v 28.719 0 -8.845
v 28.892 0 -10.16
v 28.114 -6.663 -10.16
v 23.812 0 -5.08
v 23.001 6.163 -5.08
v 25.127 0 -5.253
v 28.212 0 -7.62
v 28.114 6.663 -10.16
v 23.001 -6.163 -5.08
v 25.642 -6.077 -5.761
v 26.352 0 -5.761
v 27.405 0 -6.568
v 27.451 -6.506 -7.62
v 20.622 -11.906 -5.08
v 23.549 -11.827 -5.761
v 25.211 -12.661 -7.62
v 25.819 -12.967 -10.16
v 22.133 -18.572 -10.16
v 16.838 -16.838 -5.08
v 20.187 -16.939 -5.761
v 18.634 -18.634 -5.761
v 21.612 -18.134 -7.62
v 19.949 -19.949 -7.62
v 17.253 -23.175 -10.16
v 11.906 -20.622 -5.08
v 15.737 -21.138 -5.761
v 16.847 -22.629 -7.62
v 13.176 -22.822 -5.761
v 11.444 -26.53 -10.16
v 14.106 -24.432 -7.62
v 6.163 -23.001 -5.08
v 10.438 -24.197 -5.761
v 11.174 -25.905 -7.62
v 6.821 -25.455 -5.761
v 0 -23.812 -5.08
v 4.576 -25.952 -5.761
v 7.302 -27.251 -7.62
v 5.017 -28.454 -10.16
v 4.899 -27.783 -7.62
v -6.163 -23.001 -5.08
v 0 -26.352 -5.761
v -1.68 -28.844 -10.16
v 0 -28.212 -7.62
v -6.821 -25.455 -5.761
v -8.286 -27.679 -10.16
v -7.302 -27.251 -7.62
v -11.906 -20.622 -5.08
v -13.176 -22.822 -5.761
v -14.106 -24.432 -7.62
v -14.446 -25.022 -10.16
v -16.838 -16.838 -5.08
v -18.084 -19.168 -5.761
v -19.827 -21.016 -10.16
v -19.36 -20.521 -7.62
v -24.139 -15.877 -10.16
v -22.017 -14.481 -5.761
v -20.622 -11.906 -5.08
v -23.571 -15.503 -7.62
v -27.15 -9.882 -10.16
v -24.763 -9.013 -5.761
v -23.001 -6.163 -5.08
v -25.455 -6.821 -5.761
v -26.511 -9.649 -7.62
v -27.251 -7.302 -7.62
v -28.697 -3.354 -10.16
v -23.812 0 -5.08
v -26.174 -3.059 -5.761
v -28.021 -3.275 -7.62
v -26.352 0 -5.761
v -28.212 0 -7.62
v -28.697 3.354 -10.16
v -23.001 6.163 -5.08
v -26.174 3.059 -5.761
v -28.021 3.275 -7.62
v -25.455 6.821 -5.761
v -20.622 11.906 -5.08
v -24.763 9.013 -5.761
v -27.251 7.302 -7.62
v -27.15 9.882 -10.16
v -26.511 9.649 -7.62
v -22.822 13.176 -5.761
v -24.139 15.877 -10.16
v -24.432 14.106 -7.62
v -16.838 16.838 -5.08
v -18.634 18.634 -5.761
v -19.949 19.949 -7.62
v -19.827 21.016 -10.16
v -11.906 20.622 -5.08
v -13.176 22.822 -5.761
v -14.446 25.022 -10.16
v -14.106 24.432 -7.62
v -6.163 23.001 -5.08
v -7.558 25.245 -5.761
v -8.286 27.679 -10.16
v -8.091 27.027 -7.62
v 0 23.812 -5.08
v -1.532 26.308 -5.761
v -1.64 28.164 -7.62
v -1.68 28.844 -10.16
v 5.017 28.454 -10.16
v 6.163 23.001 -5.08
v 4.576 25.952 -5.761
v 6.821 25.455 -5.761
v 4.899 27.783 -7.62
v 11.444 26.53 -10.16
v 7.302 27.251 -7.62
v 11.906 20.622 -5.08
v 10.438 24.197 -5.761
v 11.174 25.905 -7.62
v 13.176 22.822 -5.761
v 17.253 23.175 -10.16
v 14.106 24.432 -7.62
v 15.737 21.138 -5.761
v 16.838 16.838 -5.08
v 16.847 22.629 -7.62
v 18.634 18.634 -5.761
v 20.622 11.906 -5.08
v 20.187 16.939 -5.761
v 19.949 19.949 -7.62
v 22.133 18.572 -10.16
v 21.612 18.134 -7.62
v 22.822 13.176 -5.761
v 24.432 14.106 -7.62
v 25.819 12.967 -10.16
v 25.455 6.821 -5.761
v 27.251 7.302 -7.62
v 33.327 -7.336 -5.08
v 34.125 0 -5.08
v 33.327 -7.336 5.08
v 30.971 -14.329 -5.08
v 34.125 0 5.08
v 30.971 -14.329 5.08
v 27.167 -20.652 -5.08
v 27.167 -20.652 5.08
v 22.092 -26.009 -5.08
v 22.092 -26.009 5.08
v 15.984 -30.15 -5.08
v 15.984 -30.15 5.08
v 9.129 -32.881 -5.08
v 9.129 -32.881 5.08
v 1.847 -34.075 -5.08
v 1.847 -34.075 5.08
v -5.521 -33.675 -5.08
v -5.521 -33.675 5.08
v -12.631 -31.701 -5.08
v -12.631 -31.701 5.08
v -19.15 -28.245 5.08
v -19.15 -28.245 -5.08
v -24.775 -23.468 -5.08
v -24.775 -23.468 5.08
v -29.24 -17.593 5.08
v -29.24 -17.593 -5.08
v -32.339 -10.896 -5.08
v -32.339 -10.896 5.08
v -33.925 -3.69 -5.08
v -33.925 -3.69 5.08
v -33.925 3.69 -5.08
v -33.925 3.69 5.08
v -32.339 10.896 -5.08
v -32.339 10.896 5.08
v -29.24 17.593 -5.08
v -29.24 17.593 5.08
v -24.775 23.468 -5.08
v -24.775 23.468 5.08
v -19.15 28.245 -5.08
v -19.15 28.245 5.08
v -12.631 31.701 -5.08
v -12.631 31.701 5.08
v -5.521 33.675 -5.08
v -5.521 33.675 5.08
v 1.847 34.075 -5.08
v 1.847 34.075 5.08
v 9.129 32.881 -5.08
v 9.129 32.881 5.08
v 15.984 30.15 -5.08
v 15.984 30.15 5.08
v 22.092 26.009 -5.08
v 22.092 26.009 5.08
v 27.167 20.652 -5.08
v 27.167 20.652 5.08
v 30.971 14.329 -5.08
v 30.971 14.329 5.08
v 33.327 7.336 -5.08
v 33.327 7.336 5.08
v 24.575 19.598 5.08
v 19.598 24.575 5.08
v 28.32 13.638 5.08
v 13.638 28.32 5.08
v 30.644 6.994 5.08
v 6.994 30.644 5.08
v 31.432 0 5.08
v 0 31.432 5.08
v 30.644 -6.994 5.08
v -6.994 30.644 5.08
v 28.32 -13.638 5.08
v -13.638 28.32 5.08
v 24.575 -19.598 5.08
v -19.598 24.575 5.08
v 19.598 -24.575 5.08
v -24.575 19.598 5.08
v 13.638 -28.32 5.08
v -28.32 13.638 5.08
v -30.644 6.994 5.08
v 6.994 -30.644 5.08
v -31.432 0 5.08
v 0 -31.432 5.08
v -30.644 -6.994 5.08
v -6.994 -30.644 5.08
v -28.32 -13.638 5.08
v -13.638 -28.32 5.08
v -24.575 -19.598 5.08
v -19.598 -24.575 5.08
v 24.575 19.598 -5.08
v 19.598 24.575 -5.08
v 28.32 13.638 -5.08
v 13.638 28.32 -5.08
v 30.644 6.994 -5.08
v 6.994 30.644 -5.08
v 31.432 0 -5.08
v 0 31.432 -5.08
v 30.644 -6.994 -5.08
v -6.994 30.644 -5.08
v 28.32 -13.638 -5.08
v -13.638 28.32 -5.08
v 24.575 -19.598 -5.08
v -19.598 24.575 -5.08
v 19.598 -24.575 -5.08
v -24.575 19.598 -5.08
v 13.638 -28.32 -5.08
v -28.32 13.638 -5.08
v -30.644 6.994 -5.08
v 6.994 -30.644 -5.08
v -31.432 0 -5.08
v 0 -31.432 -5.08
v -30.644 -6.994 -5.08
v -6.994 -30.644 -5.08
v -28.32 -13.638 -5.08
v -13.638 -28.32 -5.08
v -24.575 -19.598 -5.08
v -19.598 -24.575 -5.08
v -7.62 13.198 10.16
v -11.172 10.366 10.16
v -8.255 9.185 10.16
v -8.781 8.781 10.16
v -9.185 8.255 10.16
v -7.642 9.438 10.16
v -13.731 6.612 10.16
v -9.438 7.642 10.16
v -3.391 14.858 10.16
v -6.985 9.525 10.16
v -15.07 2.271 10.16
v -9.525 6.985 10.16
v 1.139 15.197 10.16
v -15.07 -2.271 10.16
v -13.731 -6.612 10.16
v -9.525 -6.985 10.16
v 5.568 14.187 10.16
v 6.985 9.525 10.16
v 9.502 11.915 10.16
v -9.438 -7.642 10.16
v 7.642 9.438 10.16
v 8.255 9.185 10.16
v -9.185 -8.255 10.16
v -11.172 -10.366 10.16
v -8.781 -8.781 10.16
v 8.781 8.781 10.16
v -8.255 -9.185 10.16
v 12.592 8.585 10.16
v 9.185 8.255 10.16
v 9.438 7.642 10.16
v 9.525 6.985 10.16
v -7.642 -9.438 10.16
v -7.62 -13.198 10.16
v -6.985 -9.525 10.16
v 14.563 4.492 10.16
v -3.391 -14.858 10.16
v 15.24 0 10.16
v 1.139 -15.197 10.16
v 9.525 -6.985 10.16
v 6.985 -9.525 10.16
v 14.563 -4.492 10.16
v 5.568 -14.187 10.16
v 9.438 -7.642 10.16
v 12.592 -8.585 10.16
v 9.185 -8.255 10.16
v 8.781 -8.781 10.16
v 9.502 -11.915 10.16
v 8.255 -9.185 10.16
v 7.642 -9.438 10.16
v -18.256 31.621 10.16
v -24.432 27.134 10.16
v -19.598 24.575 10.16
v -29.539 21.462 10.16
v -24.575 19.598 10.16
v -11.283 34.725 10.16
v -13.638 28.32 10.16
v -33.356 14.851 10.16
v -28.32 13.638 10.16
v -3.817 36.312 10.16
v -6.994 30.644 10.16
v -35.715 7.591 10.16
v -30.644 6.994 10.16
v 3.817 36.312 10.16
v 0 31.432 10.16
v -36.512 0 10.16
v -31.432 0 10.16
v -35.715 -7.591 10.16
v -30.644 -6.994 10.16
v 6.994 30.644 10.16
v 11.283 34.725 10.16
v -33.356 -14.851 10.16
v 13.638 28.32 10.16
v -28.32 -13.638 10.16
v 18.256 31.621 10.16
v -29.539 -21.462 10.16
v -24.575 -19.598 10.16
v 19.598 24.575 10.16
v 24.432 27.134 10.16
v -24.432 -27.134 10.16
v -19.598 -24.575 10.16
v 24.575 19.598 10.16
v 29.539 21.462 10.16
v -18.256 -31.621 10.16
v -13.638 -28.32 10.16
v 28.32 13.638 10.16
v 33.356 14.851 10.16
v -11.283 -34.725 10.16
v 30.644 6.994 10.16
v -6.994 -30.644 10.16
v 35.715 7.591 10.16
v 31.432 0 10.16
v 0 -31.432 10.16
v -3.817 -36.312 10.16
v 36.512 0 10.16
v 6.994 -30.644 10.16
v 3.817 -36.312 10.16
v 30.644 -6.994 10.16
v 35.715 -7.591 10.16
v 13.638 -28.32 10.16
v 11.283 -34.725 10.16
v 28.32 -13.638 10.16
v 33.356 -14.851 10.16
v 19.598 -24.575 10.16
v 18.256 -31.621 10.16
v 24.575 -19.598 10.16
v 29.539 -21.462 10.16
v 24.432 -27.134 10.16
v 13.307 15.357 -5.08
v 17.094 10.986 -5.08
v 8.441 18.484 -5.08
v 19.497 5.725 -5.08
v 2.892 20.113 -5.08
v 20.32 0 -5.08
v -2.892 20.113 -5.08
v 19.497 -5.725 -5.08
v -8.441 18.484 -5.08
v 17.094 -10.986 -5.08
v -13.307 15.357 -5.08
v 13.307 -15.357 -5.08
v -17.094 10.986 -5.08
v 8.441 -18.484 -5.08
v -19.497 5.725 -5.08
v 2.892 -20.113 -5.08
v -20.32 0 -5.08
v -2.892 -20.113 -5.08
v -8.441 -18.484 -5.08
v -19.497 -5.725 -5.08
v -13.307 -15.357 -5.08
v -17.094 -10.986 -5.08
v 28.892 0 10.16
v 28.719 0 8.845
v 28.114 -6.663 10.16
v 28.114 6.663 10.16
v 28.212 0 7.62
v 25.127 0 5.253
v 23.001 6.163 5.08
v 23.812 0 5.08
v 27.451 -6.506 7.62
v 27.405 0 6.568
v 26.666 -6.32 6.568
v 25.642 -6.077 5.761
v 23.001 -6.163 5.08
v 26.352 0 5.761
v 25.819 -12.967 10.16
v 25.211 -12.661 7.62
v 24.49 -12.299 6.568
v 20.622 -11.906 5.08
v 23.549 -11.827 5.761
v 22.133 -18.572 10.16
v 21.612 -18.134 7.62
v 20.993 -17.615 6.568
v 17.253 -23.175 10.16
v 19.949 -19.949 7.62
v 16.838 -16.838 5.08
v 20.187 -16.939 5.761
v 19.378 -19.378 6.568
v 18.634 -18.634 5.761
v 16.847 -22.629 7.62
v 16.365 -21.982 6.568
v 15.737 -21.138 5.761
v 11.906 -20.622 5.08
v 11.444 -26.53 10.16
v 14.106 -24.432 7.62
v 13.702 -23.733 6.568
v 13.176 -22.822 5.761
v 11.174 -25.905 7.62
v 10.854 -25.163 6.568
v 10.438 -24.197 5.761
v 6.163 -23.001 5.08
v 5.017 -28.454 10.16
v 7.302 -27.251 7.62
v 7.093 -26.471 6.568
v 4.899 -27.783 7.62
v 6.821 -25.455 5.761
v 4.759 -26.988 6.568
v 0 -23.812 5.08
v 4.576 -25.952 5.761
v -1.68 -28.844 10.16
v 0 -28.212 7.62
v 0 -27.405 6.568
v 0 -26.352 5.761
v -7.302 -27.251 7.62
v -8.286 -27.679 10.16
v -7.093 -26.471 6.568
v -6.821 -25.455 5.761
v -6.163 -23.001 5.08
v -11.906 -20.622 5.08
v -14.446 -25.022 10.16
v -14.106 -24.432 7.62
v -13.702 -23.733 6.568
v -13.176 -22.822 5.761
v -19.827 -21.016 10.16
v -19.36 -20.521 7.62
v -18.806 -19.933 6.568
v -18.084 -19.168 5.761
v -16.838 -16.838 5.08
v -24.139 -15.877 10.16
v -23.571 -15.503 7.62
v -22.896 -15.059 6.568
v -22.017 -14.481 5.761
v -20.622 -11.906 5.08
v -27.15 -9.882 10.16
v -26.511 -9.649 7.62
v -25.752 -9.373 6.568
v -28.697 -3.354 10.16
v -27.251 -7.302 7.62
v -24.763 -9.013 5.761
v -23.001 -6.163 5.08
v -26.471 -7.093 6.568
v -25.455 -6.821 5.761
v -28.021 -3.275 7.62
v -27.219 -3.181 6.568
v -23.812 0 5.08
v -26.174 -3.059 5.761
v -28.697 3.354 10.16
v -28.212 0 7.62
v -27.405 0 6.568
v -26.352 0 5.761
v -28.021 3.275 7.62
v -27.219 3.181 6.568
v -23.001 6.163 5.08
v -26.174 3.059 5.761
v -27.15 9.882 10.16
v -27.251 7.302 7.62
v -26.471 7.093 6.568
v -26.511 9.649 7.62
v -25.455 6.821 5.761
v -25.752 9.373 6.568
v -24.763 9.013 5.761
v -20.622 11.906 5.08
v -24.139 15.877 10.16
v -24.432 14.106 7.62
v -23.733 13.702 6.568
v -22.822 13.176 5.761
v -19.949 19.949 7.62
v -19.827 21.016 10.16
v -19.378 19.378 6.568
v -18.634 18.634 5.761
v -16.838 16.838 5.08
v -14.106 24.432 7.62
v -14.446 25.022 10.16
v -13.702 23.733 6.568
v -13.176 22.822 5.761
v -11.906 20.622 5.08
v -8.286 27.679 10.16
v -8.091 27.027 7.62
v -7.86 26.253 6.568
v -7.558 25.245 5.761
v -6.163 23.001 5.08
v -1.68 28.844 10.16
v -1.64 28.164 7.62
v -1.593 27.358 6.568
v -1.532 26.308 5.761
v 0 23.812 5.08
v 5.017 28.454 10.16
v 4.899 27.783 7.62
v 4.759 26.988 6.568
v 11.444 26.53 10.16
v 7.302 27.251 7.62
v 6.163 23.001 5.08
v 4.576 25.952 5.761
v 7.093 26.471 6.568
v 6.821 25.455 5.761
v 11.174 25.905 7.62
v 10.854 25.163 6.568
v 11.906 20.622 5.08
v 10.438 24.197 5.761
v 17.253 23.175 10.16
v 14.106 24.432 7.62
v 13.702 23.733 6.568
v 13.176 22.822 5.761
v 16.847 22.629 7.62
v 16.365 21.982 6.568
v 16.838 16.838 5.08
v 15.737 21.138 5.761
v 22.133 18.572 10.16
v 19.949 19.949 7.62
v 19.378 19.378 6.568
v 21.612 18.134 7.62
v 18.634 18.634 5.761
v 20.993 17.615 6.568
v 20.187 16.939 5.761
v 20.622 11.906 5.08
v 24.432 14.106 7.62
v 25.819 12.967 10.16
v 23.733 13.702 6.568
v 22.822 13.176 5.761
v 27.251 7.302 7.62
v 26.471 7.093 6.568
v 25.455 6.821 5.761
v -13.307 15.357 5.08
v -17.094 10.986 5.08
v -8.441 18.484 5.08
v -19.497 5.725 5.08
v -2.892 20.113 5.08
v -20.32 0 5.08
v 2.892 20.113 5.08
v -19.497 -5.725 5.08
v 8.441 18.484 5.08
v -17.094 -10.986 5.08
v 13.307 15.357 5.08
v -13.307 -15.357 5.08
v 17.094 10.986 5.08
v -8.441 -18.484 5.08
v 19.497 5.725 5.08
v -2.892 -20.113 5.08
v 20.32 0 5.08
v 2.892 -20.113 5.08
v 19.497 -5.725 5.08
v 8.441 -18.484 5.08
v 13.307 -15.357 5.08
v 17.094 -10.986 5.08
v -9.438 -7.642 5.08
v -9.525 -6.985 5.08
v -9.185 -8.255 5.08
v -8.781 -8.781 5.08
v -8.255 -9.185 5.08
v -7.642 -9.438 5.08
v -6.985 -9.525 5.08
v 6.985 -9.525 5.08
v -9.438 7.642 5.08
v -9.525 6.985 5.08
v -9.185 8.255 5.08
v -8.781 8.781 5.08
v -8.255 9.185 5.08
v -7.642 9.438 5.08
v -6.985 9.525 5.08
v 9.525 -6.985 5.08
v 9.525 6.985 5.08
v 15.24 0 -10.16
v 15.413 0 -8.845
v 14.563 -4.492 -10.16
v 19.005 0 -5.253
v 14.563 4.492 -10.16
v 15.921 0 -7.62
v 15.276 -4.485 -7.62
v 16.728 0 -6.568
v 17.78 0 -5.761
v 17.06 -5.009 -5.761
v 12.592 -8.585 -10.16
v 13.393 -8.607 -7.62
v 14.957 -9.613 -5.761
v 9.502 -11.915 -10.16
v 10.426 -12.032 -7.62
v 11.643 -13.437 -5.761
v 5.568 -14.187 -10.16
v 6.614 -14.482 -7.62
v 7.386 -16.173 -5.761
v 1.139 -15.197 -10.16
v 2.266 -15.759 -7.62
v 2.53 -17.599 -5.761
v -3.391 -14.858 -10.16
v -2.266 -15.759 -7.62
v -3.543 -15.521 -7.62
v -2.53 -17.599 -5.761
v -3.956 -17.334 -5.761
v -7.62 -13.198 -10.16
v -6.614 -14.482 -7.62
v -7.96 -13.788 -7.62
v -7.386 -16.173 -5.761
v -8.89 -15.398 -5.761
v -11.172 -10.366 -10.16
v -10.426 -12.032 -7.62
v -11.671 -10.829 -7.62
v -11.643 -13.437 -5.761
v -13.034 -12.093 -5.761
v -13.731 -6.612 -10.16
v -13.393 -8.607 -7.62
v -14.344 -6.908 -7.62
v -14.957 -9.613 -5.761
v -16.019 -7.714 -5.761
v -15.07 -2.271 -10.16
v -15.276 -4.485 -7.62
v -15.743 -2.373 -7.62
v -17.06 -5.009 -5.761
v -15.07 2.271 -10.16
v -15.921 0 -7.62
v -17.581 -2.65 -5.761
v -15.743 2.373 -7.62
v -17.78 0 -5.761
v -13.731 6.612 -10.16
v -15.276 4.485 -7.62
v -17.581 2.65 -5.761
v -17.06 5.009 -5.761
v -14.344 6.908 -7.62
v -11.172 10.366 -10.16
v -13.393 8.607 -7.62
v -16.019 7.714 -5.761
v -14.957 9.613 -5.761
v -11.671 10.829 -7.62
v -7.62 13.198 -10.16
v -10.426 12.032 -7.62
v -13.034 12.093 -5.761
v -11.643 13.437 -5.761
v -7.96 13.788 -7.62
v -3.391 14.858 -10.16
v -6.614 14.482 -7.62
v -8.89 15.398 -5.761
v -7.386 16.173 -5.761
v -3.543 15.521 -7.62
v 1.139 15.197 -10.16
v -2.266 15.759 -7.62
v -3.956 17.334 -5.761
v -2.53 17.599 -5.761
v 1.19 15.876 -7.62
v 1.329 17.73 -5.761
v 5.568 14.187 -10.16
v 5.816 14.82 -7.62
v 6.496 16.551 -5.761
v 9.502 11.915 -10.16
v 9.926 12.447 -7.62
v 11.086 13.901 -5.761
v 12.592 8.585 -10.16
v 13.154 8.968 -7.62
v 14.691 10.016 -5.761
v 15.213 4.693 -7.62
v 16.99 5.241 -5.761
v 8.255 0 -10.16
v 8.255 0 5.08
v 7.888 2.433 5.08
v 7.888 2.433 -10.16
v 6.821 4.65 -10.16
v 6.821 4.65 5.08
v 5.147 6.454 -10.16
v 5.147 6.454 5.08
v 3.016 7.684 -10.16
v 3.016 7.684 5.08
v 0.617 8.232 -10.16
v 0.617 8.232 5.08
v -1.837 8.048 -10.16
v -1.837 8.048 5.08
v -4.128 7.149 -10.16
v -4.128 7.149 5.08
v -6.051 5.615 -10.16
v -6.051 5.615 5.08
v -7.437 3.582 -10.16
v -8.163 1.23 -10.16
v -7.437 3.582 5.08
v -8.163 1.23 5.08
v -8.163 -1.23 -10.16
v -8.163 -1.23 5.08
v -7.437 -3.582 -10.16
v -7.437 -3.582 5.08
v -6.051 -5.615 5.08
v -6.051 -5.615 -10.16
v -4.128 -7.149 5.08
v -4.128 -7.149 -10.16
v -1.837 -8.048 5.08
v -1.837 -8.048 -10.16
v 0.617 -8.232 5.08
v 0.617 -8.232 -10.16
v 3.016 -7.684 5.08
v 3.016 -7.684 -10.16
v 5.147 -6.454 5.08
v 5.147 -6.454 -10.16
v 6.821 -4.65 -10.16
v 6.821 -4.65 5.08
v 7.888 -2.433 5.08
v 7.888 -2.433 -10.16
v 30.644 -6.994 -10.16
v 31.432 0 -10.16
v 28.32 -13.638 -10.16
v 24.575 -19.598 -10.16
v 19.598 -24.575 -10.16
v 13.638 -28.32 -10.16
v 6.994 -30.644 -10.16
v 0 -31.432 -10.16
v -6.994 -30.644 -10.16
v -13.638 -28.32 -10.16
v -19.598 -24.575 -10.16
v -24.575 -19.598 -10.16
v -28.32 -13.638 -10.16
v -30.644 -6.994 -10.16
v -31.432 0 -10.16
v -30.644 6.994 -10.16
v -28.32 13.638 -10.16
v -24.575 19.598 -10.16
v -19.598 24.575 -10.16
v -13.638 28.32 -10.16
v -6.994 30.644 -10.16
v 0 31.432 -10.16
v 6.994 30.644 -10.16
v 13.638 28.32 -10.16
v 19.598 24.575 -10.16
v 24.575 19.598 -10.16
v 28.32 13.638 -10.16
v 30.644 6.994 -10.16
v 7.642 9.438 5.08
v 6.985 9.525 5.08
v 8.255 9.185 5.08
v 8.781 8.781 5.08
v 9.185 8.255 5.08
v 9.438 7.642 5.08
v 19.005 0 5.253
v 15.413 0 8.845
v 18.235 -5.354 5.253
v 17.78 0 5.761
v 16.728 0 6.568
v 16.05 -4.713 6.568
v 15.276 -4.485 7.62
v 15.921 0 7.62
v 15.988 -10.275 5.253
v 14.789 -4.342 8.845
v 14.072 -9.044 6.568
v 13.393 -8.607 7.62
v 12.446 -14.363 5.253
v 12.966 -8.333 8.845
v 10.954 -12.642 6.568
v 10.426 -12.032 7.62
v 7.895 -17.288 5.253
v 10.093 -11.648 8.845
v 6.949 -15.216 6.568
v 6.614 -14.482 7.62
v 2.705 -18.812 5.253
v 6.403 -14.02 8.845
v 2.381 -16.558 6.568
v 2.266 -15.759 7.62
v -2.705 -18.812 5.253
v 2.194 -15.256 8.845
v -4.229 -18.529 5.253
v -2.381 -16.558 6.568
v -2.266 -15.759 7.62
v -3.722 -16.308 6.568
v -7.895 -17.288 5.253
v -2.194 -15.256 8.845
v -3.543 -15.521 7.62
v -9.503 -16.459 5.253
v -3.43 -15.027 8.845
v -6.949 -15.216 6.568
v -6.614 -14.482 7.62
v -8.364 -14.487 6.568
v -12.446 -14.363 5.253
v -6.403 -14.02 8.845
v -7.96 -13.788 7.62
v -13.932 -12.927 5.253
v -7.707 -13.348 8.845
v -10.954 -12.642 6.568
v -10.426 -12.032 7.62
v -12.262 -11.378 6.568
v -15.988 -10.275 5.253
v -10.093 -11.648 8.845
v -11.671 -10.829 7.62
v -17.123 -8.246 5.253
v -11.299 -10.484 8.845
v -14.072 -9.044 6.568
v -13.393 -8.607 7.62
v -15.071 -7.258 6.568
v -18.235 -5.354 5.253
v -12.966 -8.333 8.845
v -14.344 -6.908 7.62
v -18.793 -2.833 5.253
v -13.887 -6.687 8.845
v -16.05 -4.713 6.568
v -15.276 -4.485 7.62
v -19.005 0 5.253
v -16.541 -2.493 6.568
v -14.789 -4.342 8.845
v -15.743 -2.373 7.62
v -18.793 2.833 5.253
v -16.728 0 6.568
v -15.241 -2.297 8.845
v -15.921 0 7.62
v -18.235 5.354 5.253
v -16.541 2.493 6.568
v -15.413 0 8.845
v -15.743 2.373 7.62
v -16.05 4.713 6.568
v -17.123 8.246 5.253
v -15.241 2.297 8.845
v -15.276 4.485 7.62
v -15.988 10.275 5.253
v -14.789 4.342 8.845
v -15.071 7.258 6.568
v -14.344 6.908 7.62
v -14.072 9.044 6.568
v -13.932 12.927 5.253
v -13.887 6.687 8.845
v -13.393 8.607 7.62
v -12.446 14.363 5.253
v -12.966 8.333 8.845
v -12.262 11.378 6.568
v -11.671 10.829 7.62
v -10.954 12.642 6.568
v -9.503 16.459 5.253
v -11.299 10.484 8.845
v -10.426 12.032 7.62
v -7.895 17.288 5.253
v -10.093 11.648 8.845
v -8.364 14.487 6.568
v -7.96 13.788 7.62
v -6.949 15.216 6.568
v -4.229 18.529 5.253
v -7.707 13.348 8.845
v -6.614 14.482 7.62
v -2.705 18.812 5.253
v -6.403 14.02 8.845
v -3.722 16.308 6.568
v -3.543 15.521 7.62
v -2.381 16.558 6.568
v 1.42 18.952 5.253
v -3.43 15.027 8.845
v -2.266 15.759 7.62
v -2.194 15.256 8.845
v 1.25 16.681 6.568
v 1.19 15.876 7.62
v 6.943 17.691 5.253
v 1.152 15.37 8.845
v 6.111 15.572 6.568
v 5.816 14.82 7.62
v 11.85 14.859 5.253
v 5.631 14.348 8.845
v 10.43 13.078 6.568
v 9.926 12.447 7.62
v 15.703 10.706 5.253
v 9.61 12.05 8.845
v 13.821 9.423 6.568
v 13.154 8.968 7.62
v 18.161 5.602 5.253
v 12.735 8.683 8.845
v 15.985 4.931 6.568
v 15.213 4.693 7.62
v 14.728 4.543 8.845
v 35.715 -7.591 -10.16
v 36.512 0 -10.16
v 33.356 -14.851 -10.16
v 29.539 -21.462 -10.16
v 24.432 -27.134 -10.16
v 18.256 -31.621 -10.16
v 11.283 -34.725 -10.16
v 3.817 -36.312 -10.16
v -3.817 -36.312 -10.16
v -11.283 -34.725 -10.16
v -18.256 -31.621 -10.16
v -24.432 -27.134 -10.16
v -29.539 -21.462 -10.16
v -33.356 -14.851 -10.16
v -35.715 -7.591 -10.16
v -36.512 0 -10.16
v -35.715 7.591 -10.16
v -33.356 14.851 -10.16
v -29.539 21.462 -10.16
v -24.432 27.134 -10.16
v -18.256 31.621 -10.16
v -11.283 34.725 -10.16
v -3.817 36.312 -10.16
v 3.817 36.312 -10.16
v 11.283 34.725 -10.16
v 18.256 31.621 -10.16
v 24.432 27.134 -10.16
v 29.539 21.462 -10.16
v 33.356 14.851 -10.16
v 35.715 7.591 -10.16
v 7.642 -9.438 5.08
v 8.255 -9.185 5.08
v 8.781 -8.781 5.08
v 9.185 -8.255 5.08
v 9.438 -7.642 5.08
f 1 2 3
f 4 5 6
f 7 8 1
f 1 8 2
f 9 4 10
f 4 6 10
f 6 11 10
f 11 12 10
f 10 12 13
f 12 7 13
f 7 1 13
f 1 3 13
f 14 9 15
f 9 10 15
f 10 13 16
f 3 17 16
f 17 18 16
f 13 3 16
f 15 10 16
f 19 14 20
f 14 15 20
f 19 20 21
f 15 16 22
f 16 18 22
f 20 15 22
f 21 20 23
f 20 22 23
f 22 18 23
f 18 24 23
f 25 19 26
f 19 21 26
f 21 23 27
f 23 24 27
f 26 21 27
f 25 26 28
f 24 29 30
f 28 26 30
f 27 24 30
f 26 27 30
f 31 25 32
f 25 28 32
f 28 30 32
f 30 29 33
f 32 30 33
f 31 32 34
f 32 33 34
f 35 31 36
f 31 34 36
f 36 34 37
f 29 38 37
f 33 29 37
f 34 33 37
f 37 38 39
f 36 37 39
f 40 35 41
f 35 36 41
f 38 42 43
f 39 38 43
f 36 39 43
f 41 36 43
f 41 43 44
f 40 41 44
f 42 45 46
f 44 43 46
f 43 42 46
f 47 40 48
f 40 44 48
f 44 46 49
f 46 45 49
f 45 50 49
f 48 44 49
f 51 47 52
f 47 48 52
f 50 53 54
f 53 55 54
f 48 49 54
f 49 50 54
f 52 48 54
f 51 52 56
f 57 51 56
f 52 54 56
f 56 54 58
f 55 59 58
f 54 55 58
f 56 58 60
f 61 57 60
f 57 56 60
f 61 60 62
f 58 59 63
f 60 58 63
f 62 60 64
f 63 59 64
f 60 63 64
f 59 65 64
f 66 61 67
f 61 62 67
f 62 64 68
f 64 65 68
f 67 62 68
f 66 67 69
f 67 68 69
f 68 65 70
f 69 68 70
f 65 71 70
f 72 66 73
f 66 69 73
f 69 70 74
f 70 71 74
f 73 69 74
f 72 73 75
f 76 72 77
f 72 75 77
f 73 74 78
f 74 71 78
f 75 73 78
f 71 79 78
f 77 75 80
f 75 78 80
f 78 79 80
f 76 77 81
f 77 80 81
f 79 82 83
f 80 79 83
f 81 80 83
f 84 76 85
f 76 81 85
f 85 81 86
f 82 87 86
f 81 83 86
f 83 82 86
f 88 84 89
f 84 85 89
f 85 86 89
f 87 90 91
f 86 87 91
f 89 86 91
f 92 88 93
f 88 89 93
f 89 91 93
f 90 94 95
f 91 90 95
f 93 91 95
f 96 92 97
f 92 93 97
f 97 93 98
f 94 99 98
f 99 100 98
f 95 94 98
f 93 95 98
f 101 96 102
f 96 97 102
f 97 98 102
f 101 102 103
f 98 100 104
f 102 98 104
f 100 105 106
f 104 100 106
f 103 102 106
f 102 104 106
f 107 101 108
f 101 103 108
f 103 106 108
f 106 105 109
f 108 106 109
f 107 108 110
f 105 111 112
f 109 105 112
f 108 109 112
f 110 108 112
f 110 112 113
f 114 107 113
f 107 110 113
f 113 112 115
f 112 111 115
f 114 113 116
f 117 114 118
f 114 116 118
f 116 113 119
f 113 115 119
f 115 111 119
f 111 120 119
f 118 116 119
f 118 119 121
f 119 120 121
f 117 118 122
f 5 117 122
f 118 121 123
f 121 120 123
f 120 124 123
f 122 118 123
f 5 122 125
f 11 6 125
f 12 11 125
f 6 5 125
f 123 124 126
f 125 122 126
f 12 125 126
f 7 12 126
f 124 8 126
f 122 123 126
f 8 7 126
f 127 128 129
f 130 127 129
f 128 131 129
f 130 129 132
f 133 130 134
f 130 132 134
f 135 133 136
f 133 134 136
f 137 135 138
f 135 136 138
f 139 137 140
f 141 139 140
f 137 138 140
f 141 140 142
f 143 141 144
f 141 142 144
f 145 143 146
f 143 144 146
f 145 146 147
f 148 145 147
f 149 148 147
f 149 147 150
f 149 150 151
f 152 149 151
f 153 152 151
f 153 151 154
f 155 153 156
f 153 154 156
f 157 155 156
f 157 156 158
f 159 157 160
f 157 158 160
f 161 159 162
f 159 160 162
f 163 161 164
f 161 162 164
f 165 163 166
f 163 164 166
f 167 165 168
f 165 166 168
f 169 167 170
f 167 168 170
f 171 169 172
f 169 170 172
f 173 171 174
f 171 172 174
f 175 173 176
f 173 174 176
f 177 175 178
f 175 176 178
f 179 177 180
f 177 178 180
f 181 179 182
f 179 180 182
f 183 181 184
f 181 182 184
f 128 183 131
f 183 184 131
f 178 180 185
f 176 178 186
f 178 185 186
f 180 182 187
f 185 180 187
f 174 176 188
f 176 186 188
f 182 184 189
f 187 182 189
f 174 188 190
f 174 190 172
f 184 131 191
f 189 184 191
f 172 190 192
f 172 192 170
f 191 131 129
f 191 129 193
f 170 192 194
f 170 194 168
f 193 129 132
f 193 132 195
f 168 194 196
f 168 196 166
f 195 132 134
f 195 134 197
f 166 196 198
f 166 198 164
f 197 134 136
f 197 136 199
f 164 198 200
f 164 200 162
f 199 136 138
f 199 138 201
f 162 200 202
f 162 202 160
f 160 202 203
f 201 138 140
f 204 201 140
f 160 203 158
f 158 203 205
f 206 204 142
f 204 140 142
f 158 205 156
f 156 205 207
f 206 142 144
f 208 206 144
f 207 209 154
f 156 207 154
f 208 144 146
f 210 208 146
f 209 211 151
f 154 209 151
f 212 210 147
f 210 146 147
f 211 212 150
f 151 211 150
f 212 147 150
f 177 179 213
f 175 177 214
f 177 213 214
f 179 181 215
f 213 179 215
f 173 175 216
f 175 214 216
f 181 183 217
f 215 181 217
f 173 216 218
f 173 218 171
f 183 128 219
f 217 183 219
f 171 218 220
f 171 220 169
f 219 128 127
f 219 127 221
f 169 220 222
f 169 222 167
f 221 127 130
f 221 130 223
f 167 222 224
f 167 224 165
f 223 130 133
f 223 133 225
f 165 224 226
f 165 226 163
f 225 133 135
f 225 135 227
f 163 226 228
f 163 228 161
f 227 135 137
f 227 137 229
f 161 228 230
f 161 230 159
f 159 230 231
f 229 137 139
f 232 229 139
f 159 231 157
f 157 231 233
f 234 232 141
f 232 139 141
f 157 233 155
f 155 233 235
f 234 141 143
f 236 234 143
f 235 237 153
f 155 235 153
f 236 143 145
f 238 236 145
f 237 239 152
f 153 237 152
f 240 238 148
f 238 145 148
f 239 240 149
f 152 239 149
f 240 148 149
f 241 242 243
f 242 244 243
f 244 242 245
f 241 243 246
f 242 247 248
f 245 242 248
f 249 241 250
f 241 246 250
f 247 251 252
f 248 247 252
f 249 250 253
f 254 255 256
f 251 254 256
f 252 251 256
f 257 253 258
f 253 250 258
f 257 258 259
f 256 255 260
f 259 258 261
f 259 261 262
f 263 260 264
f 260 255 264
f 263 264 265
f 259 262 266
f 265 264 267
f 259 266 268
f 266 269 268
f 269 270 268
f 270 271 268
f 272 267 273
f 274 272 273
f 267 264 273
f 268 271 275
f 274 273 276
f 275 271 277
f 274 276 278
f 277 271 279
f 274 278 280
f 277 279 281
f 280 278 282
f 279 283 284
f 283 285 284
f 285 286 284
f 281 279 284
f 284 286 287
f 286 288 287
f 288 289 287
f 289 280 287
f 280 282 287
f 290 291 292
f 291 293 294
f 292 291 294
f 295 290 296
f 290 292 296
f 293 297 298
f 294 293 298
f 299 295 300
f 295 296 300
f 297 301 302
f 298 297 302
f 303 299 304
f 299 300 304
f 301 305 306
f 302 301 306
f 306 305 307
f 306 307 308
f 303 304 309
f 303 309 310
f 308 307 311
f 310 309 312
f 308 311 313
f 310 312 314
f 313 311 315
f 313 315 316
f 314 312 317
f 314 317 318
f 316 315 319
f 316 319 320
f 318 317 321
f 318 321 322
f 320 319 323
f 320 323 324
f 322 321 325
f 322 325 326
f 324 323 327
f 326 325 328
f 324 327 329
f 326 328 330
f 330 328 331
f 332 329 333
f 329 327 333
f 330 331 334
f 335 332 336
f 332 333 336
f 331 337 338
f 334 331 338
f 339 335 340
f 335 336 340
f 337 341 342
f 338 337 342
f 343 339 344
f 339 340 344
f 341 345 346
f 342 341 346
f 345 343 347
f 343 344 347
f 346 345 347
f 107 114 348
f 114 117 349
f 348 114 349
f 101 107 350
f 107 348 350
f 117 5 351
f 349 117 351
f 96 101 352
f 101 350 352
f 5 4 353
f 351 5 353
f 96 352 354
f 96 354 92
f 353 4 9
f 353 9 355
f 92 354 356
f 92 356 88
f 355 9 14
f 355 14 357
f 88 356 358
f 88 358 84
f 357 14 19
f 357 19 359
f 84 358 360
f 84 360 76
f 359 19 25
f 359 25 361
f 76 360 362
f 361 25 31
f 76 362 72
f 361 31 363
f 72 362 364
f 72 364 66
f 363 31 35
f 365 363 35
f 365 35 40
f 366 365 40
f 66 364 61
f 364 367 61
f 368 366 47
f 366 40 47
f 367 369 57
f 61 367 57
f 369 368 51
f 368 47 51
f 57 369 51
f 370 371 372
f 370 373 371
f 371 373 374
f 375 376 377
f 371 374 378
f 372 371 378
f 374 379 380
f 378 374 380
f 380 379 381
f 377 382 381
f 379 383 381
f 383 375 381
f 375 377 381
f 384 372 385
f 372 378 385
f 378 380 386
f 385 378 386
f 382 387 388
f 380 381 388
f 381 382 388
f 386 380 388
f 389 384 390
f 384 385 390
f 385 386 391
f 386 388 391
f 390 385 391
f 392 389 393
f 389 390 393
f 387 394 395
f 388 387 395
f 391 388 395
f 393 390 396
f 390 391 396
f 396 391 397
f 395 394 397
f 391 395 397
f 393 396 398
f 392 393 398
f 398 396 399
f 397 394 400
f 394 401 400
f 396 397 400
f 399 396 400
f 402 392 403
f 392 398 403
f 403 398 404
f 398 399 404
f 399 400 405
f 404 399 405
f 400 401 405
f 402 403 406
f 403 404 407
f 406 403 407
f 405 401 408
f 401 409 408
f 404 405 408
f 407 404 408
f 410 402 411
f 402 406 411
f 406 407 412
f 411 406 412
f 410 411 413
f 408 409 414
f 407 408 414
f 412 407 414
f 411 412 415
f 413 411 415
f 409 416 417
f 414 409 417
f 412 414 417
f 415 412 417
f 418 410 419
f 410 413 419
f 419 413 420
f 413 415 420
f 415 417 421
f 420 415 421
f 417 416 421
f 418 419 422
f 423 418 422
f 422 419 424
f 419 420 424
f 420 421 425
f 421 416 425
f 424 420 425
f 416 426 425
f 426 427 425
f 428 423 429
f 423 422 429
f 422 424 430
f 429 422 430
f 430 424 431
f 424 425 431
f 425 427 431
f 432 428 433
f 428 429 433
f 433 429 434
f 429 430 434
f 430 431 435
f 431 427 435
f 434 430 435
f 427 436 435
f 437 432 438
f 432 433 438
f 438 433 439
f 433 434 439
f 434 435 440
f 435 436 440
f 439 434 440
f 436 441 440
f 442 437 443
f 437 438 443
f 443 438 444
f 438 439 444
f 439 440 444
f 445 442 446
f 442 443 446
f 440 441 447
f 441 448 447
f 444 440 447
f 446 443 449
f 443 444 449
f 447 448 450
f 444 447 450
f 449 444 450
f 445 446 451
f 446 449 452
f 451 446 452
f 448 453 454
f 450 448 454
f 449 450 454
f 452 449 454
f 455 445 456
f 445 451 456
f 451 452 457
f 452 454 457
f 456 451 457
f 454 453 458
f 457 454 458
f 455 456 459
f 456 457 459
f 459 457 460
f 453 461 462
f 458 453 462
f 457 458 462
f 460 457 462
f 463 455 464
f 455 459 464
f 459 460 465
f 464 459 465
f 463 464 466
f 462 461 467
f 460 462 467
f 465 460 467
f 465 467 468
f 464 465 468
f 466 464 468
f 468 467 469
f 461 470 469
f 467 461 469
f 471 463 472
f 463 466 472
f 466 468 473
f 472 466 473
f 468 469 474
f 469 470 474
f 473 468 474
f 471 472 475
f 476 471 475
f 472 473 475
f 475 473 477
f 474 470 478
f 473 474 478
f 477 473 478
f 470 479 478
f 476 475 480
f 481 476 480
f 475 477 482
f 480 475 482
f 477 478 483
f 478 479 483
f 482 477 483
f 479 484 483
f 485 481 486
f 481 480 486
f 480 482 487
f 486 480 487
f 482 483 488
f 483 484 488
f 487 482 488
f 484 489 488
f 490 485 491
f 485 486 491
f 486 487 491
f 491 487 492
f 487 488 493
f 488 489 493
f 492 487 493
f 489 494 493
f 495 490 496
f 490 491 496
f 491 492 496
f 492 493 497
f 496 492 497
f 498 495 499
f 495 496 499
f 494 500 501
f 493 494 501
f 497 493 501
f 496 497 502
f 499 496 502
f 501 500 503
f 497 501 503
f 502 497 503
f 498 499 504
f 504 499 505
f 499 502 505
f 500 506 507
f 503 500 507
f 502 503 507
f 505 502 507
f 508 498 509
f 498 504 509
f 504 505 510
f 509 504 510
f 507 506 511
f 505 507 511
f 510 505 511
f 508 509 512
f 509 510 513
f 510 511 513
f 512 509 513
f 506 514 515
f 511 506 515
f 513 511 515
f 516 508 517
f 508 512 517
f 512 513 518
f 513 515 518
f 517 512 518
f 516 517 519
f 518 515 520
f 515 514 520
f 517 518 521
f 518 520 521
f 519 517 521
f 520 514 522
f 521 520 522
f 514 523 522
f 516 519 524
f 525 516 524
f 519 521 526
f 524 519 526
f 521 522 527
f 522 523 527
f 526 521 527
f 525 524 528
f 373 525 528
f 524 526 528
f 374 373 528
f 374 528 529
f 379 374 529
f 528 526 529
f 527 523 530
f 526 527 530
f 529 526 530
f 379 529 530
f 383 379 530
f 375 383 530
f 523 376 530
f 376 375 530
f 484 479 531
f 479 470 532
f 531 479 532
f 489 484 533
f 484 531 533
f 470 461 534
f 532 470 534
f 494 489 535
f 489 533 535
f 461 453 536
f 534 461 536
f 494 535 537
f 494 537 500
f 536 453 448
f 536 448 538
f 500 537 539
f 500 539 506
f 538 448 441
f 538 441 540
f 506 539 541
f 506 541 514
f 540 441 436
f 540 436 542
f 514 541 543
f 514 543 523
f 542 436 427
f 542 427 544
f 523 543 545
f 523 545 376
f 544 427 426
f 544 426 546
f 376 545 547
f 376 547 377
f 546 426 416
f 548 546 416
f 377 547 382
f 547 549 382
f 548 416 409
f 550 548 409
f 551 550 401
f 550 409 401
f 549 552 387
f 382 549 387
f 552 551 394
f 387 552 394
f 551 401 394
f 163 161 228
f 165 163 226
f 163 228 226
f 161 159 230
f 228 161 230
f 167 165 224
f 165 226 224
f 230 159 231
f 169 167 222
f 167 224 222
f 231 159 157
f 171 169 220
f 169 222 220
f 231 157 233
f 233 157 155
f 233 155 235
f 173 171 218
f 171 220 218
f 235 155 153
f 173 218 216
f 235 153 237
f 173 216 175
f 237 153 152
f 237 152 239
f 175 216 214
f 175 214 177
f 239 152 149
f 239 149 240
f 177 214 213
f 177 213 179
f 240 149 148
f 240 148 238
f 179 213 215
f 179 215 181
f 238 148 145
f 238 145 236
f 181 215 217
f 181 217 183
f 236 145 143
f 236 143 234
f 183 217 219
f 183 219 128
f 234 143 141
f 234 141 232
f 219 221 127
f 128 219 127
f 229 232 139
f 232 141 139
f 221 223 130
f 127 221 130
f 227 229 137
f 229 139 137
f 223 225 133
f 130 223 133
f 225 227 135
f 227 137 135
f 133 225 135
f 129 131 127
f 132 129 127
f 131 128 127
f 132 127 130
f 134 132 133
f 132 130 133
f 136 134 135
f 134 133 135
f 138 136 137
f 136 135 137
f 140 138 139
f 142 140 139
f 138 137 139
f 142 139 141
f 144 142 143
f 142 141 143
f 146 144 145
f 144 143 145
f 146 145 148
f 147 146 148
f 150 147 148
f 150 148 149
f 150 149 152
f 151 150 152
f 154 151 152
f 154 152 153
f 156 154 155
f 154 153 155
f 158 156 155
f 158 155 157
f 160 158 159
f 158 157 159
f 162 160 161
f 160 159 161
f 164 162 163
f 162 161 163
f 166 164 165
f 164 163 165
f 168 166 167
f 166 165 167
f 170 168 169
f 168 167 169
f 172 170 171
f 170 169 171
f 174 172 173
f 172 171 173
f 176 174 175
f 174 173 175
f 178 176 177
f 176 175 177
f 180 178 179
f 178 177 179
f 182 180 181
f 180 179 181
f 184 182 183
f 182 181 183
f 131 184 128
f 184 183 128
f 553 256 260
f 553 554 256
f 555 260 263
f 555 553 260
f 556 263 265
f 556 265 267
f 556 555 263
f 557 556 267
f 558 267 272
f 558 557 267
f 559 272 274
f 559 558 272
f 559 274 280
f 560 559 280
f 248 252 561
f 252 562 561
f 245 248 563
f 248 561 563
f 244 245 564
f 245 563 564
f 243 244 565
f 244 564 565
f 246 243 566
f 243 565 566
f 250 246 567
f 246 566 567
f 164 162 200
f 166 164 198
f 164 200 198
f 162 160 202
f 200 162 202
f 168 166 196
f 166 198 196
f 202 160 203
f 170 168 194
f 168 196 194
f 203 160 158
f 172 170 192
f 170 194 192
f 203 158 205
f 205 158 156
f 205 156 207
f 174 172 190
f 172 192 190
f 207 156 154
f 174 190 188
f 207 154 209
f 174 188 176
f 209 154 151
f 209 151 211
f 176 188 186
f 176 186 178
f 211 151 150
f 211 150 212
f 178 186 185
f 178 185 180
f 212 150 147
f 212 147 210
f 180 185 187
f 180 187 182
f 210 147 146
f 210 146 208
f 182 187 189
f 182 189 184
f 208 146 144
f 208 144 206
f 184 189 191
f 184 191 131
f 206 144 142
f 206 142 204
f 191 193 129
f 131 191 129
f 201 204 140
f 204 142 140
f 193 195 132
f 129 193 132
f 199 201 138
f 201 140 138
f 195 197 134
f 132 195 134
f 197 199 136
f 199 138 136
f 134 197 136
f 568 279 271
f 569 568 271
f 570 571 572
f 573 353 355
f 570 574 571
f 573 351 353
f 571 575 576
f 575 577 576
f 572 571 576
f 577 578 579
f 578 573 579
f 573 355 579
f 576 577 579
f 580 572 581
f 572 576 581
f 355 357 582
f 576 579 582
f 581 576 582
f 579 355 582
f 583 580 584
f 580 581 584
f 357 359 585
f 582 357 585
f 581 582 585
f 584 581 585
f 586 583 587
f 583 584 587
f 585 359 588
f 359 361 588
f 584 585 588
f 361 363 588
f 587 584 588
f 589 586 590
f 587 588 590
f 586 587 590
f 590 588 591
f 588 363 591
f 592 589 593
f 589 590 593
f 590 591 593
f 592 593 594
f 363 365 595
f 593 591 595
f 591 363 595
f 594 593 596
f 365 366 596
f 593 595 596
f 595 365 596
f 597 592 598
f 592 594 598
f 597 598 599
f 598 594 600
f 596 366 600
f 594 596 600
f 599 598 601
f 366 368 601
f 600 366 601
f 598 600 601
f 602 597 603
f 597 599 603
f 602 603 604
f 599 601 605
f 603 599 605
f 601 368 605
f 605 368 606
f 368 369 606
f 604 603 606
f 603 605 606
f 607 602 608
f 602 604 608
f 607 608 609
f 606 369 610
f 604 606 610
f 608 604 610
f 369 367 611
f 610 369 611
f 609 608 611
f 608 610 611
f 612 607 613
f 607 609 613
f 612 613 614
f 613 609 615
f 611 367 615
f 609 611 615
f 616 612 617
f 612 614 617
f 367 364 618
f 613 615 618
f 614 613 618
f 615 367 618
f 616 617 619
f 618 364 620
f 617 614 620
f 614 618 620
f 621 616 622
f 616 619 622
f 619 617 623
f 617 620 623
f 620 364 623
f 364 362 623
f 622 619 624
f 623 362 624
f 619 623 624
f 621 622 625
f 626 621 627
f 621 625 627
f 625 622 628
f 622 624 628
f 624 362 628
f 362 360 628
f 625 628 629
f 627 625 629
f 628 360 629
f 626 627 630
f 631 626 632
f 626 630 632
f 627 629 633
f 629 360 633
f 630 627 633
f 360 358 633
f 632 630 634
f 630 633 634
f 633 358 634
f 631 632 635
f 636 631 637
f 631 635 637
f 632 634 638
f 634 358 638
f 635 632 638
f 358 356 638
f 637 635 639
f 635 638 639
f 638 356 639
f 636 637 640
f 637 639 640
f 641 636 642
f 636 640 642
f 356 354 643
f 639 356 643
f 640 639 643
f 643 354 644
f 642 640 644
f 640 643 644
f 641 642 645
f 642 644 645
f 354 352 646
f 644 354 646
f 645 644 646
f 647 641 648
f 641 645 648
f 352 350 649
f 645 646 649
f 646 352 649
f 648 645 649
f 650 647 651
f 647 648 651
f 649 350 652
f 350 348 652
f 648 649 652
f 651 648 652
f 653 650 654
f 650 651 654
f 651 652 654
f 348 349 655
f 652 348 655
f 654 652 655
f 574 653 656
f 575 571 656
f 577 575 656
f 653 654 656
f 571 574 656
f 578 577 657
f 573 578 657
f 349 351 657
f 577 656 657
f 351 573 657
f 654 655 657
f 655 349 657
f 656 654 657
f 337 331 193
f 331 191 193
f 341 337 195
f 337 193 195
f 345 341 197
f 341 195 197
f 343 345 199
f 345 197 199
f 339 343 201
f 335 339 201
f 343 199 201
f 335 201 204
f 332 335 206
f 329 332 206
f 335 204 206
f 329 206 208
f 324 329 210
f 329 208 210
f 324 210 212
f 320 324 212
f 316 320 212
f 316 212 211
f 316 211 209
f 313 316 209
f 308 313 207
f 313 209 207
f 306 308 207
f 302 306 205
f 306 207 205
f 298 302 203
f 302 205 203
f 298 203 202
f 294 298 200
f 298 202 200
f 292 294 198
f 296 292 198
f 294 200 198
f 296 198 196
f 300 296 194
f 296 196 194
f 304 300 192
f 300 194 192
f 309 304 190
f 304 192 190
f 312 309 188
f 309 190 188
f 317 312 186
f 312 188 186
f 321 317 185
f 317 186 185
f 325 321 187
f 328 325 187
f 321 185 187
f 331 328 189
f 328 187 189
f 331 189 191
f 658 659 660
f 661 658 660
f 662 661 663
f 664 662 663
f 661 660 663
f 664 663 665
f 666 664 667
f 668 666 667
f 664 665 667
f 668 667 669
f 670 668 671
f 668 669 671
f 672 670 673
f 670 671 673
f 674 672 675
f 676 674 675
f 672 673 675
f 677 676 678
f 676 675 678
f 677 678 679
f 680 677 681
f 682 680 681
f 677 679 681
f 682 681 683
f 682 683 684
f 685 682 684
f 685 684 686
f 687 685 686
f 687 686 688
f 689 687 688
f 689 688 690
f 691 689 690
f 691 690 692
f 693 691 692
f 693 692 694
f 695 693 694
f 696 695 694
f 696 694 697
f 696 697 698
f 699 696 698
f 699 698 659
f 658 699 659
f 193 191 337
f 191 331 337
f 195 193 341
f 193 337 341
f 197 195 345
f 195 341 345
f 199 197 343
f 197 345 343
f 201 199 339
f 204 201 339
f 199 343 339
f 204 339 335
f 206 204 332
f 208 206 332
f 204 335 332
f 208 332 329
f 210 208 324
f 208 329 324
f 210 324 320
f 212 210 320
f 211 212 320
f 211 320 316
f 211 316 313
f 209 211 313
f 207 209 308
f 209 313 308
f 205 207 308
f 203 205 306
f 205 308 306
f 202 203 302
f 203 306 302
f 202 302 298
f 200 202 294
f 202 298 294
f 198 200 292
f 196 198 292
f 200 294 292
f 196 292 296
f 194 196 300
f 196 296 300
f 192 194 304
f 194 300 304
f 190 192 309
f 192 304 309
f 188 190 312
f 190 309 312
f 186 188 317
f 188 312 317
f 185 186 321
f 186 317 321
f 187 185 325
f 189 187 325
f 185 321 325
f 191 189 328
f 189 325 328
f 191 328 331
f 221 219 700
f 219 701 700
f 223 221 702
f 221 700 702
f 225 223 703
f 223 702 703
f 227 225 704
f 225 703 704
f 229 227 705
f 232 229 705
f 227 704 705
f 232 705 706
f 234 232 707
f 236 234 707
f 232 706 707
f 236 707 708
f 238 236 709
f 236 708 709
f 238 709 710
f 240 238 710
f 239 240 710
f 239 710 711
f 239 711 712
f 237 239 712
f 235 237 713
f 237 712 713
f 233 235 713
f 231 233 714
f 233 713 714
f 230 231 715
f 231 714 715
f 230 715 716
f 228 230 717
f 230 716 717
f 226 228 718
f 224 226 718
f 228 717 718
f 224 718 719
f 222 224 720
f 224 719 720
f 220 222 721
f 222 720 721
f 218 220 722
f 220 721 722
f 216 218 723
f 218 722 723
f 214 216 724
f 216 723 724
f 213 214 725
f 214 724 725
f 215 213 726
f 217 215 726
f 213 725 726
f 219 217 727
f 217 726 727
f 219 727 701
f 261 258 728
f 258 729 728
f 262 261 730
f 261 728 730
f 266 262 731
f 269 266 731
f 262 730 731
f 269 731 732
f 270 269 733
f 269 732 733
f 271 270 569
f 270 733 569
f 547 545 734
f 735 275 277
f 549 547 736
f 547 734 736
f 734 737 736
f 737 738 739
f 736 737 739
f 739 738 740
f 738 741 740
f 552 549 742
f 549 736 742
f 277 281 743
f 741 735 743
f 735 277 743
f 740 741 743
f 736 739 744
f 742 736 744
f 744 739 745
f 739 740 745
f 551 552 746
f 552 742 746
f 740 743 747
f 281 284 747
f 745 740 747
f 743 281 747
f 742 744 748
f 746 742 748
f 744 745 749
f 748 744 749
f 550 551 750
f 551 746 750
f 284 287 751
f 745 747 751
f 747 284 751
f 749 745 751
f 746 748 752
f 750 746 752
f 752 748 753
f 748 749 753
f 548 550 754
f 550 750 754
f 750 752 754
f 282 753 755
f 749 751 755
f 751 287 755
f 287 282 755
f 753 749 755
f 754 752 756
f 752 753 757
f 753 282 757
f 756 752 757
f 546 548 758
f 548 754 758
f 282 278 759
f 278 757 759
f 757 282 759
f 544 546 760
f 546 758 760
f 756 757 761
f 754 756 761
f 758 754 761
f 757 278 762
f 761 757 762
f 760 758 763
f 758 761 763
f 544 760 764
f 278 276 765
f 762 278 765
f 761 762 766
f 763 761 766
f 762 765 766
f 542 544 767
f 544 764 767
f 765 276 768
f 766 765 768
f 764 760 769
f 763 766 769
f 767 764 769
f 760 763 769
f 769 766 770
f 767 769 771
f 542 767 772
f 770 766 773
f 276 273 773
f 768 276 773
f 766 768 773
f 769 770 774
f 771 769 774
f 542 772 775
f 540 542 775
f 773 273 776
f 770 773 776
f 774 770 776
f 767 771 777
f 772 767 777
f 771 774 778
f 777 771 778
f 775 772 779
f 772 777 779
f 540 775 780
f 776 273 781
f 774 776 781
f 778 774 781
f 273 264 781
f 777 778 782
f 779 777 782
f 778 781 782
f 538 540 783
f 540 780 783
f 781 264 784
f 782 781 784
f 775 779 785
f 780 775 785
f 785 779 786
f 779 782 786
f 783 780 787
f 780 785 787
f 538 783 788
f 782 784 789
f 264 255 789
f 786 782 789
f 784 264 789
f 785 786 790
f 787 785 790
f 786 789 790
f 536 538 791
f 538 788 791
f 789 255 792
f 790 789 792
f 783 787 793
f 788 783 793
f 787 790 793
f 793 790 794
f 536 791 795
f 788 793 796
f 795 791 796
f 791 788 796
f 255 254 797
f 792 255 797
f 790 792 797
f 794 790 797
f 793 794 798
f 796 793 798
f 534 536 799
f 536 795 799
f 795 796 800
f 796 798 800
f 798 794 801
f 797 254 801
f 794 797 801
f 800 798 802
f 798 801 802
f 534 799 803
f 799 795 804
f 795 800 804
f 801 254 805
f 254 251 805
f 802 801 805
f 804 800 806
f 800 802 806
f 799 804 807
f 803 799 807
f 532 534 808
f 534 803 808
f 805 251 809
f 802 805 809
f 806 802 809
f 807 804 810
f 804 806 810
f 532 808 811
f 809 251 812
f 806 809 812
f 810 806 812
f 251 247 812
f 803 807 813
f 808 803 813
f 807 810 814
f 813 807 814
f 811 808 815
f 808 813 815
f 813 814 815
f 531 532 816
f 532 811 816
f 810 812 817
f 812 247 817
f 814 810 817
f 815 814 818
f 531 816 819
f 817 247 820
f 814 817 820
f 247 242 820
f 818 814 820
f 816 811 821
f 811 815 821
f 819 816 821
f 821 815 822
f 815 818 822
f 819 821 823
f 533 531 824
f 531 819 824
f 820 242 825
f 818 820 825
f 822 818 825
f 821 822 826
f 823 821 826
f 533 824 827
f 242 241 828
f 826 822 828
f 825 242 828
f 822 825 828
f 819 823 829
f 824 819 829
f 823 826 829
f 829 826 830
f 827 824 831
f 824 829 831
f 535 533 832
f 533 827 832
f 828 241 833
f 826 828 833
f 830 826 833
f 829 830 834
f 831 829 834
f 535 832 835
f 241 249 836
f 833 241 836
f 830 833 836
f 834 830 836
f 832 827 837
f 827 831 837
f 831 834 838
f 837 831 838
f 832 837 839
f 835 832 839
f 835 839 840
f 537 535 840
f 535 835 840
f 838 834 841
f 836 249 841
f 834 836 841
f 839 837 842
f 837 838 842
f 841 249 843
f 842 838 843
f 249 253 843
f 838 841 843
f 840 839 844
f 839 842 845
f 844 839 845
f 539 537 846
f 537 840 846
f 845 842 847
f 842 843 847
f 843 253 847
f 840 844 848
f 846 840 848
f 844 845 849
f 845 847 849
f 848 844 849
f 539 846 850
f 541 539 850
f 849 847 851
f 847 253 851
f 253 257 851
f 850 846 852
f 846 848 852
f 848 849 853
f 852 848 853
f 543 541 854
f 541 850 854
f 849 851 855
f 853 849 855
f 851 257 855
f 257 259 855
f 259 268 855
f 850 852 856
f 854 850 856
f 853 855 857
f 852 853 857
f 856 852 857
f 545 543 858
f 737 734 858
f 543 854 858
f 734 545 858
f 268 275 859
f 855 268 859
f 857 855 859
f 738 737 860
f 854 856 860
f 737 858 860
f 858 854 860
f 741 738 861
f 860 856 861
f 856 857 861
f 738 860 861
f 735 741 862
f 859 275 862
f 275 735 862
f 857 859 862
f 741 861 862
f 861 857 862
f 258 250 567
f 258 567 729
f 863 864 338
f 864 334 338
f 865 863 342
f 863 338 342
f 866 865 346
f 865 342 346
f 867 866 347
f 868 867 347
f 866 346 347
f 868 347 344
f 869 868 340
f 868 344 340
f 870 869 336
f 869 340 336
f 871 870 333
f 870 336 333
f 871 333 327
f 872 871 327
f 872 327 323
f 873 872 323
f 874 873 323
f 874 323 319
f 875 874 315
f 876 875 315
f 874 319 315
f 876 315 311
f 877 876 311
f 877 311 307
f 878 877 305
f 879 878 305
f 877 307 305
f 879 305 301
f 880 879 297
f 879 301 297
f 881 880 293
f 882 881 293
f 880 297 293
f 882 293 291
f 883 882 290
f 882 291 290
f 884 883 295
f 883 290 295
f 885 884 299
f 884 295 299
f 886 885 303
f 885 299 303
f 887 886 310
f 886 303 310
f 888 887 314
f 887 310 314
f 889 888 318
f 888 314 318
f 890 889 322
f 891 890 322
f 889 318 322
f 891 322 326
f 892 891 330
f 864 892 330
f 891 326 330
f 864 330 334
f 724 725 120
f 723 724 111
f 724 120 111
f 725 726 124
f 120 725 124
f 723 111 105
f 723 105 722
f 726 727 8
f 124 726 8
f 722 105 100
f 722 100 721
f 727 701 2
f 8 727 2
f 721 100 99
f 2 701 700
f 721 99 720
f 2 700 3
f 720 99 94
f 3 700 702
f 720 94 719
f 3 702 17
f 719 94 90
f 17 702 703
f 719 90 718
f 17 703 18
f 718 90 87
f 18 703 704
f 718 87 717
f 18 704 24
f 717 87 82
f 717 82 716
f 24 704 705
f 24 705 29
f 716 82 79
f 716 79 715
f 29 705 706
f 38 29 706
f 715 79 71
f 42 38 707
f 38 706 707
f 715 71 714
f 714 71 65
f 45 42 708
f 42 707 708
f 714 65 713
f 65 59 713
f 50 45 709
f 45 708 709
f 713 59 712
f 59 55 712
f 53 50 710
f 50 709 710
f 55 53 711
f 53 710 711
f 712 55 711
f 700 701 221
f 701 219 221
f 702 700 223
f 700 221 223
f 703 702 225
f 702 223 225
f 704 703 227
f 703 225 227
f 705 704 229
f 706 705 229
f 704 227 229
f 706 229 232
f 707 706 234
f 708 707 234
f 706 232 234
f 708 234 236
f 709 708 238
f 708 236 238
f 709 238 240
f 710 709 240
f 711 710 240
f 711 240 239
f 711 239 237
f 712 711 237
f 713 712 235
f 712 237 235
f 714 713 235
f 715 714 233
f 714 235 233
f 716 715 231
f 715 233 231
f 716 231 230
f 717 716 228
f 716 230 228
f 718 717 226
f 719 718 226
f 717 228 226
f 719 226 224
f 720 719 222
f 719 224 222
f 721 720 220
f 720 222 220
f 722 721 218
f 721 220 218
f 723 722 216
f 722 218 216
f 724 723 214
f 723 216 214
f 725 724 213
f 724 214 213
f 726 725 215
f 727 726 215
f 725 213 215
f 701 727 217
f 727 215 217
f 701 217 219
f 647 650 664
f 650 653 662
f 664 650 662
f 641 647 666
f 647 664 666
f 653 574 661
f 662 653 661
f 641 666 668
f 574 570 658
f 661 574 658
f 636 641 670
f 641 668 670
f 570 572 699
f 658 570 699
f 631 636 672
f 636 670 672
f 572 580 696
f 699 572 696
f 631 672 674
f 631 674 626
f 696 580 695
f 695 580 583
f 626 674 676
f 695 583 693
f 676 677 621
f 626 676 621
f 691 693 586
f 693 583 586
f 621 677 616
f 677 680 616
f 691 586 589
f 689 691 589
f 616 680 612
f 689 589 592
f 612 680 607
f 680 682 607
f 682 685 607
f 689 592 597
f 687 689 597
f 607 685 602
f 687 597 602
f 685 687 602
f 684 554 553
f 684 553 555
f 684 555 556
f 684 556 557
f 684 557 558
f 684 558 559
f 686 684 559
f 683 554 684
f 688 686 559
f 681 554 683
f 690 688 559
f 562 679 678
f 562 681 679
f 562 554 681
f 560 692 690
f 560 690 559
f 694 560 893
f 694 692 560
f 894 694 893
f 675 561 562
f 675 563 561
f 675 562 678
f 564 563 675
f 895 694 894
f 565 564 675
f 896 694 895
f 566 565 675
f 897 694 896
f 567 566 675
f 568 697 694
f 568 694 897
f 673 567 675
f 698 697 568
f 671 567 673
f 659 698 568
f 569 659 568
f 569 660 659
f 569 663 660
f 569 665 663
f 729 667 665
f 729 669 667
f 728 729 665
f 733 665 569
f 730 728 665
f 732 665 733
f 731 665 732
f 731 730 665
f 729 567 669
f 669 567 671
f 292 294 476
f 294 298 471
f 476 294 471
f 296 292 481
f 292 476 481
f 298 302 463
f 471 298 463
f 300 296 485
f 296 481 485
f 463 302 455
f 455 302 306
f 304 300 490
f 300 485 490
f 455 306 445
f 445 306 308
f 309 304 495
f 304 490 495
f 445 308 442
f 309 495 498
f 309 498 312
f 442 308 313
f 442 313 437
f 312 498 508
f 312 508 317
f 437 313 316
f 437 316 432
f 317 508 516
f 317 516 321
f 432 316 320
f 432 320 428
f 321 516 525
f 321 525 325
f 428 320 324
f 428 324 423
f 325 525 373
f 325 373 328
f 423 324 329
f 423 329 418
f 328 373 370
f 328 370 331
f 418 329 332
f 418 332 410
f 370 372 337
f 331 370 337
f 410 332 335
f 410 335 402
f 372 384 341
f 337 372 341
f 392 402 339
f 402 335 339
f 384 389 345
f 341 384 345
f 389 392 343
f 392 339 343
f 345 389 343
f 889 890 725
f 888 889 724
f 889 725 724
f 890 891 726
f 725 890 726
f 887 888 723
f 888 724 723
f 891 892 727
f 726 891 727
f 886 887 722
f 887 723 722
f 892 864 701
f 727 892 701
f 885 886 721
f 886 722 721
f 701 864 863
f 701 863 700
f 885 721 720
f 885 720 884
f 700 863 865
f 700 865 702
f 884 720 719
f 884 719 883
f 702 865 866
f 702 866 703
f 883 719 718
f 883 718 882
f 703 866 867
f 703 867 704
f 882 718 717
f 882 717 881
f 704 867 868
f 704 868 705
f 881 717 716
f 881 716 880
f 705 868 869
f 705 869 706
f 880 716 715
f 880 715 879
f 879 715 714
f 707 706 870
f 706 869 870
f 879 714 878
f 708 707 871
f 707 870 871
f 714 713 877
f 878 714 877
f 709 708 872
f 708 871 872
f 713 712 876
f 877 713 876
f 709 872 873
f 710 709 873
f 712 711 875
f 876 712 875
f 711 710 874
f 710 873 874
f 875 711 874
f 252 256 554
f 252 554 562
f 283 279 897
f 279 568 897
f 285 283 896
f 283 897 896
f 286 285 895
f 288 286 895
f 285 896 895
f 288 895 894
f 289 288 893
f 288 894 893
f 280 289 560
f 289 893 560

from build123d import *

# Parameters (mm, degrees)
SKETCH3_W          = 19.05
SKETCH3_H          = 19.05
CUT_EXTRUDE1_DEPTH = 5.08
SKETCH4_R          = 8.255
CUT_EXTRUDE2_DEPTH = 54.838489136
FILLET1_R          = 2.54


with BuildPart() as part:
    # Sketch1 → Revolve1 (revolve)
    with BuildSketch(Plane(origin=(0, 0, 0), x_dir=(0, 0, -1), z_dir=(1, 0, 0)), mode=Mode.PRIVATE) as revolve1_sk:
        with BuildLine():
            Line((-10.16, 31.4325), (-10.16, 28.8925))
            ThreePointArc((-10.16, 28.8925), (-6.567897552, 27.404602448), (-5.08, 23.8125))
            Line((-5.08, 23.8125), (-5.08, 20.32))
            ThreePointArc((-5.08, 20.32), (-6.567897552, 16.727897552), (-10.16, 15.24))
            Line((-10.16, 15.24), (-10.16, 0))
            Line((-10.16, 0), (10.16, 0))
            Line((10.16, 0), (10.16, 15.24))
            ThreePointArc((10.16, 15.24), (6.567897552, 16.727897552), (5.08, 20.32))
            Line((5.08, 20.32), (5.08, 23.8125))
            ThreePointArc((5.08, 23.8125), (6.567897552, 27.404602448), (10.16, 28.8925))
            Line((10.16, 28.8925), (10.16, 31.4325))
            Line((10.16, 31.4325), (5.08, 31.4325))
            Line((5.08, 31.4325), (5.08, 34.1249))
            Line((5.08, 34.1249), (-5.08, 34.1249))
            Line((-5.08, 34.1249), (-5.08, 31.4325))
            Line((-5.08, 31.4325), (-10.16, 31.4325))
        make_face()
    revolve(revolve1_sk.sketch.rotate(Axis((0, 0, 33.990714689), (0, 0, -1)), 90), axis=Axis((0, 0, 33.990714689), (0, 0, -1)))

    # Sketch3 → Cut-Extrude1 (cut)
    with BuildSketch(Plane.XY.offset(10.16)):
        Rectangle(SKETCH3_W, SKETCH3_H)
    extrude(amount=-CUT_EXTRUDE1_DEPTH, mode=Mode.SUBTRACT)

    # Sketch4 → Cut-Extrude2 (cut, through all)
    with BuildSketch(Plane.XY.offset(5.08)):
        Circle(SKETCH4_R)
    extrude(amount=-CUT_EXTRUDE2_DEPTH, mode=Mode.SUBTRACT)

    # Fillet1
    fillet1_edges = [part.edges().sort_by_distance(p)[0] for p in [
        (9.525, 9.525, 7.62),
        (9.525, -9.525, 7.62),
        (-9.525, -9.525, 7.62),
        (-9.525, 9.525, 7.62),
    ]]
    fillet(fillet1_edges, radius=FILLET1_R)


with BuildPart() as body_2:
    # Sketch2 → Revolve2 (revolve)
    with BuildSketch(Plane(origin=(0, 0, 0), x_dir=(0, 0, -1), z_dir=(1, 0, 0)), mode=Mode.PRIVATE) as revolve2_sk:
        Polygon((-10.16, 31.4325), (-5.08, 31.4325), (-5.08, 34.1249), (5.08, 34.1249), (5.08, 31.4325), (10.16, 31.4325), (10.16, 36.5125), (-10.16, 36.5125), align=None)
    revolve(revolve2_sk.sketch.rotate(Axis((0, 0, 72.484250803), (0, 0, -1)), 90), axis=Axis((0, 0, 72.484250803), (0, 0, -1)))


solid = Compound([part.part, body_2.part])
